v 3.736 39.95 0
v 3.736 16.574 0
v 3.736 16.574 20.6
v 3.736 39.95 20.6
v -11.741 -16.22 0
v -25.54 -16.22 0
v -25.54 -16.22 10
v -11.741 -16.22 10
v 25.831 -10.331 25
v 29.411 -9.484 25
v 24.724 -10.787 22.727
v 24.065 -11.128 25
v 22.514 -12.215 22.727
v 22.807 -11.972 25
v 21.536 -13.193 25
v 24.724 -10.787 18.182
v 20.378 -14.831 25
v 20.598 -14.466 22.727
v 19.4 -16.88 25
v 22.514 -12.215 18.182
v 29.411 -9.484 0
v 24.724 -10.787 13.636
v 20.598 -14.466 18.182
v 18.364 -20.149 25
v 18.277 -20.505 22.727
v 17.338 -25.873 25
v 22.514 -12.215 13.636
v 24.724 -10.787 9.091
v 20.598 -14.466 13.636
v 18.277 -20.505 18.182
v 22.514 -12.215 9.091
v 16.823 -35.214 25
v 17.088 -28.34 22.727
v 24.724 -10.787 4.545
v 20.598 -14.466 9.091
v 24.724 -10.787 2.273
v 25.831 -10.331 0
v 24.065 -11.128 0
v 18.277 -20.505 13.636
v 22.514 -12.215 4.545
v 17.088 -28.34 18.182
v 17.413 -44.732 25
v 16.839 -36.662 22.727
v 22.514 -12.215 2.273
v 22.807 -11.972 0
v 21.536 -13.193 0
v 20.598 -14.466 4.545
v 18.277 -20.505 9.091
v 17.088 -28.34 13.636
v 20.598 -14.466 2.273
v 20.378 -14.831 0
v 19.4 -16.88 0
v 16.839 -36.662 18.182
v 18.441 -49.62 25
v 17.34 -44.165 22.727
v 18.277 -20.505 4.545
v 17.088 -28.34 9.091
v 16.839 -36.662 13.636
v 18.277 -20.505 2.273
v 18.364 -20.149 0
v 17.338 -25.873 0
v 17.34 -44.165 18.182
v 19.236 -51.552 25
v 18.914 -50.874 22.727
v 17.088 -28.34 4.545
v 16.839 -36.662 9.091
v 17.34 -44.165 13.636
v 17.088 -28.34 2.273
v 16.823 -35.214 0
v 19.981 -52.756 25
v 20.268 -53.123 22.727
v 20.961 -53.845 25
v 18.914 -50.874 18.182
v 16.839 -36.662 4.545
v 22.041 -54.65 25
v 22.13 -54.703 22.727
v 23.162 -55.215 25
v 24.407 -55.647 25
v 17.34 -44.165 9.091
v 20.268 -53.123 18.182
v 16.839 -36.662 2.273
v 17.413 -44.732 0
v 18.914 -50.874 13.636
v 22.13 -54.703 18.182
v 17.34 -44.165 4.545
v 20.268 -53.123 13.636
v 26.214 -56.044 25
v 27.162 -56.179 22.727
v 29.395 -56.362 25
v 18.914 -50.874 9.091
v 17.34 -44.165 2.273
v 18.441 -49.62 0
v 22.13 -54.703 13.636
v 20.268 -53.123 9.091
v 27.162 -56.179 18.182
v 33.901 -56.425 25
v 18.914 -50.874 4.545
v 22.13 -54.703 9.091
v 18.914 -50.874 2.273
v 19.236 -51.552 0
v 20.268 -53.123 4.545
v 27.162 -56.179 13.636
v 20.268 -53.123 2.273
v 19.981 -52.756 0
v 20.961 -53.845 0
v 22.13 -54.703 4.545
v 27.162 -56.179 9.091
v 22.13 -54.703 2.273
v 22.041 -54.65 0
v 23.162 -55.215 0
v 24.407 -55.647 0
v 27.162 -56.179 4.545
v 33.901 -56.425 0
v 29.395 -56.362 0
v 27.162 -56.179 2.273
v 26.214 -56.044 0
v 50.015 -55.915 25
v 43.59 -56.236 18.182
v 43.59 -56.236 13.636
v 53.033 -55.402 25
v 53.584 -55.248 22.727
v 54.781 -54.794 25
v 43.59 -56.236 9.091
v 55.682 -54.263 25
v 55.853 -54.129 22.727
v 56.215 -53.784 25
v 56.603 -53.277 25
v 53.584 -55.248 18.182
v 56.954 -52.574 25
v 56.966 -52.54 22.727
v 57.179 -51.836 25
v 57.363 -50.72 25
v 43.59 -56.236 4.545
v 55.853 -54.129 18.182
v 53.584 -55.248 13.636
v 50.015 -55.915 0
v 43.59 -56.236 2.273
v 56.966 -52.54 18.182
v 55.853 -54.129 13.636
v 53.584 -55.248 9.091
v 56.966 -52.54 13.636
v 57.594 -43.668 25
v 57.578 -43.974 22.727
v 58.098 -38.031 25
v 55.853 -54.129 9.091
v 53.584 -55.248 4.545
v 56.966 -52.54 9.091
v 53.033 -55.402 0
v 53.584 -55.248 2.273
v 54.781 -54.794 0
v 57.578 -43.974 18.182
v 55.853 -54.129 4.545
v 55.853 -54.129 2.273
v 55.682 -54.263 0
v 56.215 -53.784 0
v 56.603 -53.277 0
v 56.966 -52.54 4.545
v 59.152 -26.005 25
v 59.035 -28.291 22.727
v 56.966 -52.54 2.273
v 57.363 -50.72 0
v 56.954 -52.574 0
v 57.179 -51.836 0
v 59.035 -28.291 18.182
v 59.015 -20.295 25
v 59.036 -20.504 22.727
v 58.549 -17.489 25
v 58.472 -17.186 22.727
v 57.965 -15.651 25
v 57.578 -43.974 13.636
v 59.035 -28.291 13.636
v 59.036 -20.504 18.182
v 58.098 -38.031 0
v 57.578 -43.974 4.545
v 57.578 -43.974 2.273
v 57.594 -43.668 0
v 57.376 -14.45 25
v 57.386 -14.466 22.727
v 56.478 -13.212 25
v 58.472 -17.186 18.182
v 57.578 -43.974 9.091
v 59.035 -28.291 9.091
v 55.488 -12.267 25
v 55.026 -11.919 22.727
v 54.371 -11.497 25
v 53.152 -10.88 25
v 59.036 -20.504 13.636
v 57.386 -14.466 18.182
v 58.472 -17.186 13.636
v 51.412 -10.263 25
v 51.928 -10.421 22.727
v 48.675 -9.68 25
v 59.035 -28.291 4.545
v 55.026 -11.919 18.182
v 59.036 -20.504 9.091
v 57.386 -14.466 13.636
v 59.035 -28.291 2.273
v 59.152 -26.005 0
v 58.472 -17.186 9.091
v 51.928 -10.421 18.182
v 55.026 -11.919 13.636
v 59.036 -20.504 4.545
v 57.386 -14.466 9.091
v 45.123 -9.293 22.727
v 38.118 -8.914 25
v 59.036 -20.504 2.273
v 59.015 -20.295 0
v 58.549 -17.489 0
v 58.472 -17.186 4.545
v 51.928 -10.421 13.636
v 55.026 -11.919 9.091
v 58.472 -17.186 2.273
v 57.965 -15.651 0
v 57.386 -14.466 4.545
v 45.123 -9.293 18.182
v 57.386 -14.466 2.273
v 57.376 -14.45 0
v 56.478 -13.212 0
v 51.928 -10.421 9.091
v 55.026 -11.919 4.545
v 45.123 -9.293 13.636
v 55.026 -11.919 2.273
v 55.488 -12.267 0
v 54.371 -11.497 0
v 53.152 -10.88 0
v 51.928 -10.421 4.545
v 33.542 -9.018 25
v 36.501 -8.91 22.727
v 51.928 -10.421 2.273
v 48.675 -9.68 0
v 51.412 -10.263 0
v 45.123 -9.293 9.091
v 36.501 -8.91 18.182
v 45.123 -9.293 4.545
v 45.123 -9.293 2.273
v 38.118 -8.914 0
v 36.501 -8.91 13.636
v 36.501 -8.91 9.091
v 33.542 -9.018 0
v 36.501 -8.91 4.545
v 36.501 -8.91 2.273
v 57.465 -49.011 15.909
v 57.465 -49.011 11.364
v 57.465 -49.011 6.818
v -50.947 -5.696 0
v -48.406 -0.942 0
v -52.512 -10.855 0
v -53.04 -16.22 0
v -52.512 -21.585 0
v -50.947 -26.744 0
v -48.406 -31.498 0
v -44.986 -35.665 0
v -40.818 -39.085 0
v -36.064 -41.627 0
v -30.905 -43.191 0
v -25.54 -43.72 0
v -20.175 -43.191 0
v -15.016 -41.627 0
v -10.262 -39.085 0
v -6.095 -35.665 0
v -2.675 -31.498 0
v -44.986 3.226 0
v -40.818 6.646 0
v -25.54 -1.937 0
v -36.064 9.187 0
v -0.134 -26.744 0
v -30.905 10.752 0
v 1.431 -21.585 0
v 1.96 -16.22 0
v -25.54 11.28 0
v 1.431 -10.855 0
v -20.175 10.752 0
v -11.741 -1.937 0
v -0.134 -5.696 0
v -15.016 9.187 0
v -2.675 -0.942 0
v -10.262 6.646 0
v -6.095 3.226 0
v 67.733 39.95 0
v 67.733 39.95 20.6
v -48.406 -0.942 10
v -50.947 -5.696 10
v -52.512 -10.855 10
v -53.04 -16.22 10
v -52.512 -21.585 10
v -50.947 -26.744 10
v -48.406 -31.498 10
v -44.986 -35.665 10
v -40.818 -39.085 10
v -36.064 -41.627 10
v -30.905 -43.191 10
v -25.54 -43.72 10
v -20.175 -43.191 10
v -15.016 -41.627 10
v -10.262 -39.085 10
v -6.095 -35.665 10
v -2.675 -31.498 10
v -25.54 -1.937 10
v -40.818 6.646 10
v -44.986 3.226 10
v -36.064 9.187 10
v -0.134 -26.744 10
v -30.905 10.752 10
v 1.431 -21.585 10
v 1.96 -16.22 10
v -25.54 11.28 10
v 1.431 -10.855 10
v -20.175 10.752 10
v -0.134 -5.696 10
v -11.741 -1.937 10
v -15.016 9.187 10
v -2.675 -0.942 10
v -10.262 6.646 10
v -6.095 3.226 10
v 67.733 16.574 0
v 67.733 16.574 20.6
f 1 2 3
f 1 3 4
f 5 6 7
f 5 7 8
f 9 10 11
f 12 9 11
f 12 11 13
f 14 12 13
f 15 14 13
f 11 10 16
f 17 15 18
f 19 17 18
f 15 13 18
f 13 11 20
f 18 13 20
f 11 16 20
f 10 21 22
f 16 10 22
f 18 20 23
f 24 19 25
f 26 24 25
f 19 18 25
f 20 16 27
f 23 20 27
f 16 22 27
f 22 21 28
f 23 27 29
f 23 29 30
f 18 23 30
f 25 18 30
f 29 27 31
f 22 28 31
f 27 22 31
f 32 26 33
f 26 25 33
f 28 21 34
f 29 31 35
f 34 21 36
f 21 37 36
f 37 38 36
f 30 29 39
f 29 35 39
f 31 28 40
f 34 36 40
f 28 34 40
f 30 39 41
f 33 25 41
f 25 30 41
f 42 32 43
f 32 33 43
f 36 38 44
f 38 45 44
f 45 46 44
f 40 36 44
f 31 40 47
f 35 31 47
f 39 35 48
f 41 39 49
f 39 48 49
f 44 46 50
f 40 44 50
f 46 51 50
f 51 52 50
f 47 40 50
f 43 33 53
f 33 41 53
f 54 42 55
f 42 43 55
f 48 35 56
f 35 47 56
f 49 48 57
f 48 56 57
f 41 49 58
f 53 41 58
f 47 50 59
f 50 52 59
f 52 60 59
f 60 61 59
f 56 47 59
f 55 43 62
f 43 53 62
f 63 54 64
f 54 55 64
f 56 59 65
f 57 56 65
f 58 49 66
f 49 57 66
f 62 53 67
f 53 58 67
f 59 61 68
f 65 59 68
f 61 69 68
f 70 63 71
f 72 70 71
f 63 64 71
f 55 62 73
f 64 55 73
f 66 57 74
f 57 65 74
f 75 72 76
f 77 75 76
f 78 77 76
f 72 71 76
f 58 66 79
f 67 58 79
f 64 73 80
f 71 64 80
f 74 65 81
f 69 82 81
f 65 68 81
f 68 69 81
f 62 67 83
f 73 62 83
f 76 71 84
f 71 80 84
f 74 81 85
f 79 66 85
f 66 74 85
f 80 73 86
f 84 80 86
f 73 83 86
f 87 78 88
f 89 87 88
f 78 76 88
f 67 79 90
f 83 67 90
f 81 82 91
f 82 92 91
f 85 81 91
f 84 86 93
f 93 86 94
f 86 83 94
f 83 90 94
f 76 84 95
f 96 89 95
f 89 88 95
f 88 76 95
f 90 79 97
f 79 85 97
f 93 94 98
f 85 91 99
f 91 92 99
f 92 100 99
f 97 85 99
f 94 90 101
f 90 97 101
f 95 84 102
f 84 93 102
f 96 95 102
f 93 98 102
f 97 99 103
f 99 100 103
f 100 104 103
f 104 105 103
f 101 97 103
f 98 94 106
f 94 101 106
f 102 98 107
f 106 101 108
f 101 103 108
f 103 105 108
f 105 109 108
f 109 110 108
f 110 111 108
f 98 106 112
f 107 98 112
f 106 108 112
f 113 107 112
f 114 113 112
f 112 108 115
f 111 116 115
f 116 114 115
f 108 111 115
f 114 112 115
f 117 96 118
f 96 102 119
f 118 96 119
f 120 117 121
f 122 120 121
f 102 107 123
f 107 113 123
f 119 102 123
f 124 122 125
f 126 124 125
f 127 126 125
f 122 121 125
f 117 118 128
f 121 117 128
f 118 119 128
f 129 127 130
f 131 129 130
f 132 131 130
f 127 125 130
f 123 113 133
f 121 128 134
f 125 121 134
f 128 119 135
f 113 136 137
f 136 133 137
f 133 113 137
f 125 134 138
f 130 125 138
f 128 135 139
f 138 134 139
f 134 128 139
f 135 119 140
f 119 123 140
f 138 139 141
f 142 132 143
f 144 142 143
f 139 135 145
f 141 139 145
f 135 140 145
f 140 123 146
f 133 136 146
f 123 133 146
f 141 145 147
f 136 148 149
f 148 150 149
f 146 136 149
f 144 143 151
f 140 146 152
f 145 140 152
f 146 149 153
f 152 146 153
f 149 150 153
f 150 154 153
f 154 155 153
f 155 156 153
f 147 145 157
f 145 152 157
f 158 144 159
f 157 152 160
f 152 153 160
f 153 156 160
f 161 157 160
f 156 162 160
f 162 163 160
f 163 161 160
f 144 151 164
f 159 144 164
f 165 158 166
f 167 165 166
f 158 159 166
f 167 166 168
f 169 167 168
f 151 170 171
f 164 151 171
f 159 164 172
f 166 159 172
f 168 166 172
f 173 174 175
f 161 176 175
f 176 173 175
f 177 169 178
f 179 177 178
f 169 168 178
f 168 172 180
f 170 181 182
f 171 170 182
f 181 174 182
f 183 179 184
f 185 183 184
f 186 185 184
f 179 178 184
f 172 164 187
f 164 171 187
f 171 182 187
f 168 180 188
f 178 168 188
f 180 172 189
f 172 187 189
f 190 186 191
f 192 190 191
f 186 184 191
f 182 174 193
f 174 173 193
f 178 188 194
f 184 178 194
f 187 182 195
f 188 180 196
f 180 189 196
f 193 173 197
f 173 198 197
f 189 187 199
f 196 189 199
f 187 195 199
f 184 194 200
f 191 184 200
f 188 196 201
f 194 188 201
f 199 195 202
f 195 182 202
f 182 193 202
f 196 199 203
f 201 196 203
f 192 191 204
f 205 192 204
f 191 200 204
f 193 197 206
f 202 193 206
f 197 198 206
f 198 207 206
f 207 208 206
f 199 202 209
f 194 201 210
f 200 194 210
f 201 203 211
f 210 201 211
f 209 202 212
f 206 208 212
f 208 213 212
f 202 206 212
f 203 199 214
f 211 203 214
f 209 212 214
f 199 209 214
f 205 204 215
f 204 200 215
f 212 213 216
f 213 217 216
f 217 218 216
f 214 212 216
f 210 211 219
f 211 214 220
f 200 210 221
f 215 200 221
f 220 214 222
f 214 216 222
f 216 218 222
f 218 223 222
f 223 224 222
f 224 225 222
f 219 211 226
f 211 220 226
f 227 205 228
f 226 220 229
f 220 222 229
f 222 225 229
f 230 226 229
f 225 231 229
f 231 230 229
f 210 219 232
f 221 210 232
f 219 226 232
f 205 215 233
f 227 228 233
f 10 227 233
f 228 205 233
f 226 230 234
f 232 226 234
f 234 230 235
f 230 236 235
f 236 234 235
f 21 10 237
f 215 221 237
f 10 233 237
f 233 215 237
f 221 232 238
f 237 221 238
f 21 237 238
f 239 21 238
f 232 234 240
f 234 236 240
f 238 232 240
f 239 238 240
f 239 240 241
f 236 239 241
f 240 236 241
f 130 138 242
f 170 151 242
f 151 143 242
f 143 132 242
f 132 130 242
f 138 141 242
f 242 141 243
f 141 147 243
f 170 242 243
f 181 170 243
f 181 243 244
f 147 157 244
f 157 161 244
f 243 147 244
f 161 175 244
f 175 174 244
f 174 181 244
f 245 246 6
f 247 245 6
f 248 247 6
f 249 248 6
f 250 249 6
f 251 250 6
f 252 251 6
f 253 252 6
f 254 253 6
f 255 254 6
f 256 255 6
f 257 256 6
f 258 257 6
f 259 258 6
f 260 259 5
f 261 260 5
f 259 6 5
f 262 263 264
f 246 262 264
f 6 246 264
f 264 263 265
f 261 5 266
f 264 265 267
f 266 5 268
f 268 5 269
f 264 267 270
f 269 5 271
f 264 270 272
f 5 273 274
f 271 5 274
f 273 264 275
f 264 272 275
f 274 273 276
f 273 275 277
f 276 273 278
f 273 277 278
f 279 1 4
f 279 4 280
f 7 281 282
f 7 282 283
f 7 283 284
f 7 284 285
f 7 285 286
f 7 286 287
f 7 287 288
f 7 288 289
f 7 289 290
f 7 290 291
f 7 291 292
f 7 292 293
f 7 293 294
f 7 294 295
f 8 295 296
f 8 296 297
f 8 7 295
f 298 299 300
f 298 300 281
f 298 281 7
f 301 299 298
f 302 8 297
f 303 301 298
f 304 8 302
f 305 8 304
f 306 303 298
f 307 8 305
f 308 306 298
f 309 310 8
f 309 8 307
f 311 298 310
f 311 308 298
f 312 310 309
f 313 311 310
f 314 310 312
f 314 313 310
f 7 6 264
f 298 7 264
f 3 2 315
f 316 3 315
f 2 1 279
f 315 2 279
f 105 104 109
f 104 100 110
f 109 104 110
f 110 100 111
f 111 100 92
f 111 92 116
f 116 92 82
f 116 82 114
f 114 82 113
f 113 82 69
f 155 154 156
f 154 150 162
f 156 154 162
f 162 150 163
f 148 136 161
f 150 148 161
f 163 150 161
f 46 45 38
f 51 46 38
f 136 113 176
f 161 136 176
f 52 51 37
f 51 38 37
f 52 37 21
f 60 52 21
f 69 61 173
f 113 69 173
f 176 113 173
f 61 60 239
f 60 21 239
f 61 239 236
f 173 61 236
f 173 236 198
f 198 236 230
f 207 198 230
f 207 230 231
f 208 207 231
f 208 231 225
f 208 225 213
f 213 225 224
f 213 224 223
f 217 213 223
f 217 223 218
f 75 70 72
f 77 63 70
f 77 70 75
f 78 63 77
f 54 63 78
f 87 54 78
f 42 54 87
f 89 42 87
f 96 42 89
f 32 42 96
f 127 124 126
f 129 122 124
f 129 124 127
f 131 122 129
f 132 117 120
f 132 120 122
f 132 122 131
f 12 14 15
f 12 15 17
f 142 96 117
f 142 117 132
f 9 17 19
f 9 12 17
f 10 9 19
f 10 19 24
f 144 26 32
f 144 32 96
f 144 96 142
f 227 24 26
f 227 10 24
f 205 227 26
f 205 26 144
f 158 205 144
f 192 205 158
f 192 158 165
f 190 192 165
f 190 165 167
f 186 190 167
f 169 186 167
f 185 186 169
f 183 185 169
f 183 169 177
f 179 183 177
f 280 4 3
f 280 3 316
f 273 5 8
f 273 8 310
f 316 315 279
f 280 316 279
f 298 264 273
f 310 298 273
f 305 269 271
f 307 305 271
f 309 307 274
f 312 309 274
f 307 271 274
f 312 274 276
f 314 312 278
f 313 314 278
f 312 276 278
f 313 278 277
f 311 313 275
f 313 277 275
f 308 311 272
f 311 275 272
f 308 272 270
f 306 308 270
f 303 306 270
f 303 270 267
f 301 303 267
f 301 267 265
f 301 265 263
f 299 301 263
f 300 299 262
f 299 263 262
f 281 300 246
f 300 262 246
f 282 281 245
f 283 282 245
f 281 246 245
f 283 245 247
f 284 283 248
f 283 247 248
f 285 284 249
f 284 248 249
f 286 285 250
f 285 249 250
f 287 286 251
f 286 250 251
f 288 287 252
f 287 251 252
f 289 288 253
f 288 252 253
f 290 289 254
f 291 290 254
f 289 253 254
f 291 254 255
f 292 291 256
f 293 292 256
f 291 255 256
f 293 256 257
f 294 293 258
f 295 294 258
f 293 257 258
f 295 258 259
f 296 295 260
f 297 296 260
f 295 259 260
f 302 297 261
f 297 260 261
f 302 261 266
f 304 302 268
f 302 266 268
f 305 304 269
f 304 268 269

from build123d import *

# Parameters (mm, degrees)
F0_R     = 27.5
F0_W     = 13.7990014628
F0_H     = 14.2831781413
F1_DEPTH = 10
F2_W     = 63.9963464346
F2_H     = 23.3759097755
F3_DEPTH = 20.6
F9_DEPTH = 25


# Not quite as in the source:
# - the program builds the solid bodies; features that only make, move or delete a surface that nothing else refers to are left out


with BuildPart() as f1:
    # F0 (on Top) → F1 (new body)
    with BuildSketch(Plane.XY):
        with Locations((-25.5402568728, -16.2198804319)):
            Circle(F0_R)
        with Locations((-18.6407561414, -9.0782913612)):
            Rectangle(F0_W, F0_H, mode=Mode.SUBTRACT)
    extrude(amount=F1_DEPTH)


with BuildPart() as f3:
    # F2 (on Top) → F3 (new body)
    with BuildSketch(Plane.XY):
        with Locations((35.7344887452, 28.2618608326)):
            Rectangle(F2_W, F2_H)
    extrude(amount=F3_DEPTH)


with BuildPart() as f9:
    # F8 (on Top) → F9 (new body)
    with BuildSketch(Plane.XY):
        with BuildLine():
            add(Edge.make_bspline(
                [(29.4114947319, -9.4844894484), (26.3729347773, -9.9669040751), (16.9003945389, -12.2701929719), (16.0041992708, -44.345029821), (20.4782764199, -56.2412922253), (33.4595990445, -56.5220444535), (42.7791961025, -56.2278149781), (58.6401072937, -55.9435785579), (56.2352878094, -43.6996249686), (63.1171554107, -11.1002415527), (44.9569815233, -9.169865832), (36.6510831635, -8.7693531278), (31.9583329877, -9.0801426378), (29.4114947319, -9.4844894484)],
                knots=[0, 0, 0, 0, 0.0794581558, 0.2159553788, 0.3009189779, 0.3832422311, 0.4650488142, 0.5531355725, 0.6332820157, 0.7689335211, 0.8600368102, 0.9334003364, 1, 1, 1, 1], degree=3))
        make_face()
    extrude(amount=F9_DEPTH)


solid = Compound([f1.part, f3.part, f9.part])
